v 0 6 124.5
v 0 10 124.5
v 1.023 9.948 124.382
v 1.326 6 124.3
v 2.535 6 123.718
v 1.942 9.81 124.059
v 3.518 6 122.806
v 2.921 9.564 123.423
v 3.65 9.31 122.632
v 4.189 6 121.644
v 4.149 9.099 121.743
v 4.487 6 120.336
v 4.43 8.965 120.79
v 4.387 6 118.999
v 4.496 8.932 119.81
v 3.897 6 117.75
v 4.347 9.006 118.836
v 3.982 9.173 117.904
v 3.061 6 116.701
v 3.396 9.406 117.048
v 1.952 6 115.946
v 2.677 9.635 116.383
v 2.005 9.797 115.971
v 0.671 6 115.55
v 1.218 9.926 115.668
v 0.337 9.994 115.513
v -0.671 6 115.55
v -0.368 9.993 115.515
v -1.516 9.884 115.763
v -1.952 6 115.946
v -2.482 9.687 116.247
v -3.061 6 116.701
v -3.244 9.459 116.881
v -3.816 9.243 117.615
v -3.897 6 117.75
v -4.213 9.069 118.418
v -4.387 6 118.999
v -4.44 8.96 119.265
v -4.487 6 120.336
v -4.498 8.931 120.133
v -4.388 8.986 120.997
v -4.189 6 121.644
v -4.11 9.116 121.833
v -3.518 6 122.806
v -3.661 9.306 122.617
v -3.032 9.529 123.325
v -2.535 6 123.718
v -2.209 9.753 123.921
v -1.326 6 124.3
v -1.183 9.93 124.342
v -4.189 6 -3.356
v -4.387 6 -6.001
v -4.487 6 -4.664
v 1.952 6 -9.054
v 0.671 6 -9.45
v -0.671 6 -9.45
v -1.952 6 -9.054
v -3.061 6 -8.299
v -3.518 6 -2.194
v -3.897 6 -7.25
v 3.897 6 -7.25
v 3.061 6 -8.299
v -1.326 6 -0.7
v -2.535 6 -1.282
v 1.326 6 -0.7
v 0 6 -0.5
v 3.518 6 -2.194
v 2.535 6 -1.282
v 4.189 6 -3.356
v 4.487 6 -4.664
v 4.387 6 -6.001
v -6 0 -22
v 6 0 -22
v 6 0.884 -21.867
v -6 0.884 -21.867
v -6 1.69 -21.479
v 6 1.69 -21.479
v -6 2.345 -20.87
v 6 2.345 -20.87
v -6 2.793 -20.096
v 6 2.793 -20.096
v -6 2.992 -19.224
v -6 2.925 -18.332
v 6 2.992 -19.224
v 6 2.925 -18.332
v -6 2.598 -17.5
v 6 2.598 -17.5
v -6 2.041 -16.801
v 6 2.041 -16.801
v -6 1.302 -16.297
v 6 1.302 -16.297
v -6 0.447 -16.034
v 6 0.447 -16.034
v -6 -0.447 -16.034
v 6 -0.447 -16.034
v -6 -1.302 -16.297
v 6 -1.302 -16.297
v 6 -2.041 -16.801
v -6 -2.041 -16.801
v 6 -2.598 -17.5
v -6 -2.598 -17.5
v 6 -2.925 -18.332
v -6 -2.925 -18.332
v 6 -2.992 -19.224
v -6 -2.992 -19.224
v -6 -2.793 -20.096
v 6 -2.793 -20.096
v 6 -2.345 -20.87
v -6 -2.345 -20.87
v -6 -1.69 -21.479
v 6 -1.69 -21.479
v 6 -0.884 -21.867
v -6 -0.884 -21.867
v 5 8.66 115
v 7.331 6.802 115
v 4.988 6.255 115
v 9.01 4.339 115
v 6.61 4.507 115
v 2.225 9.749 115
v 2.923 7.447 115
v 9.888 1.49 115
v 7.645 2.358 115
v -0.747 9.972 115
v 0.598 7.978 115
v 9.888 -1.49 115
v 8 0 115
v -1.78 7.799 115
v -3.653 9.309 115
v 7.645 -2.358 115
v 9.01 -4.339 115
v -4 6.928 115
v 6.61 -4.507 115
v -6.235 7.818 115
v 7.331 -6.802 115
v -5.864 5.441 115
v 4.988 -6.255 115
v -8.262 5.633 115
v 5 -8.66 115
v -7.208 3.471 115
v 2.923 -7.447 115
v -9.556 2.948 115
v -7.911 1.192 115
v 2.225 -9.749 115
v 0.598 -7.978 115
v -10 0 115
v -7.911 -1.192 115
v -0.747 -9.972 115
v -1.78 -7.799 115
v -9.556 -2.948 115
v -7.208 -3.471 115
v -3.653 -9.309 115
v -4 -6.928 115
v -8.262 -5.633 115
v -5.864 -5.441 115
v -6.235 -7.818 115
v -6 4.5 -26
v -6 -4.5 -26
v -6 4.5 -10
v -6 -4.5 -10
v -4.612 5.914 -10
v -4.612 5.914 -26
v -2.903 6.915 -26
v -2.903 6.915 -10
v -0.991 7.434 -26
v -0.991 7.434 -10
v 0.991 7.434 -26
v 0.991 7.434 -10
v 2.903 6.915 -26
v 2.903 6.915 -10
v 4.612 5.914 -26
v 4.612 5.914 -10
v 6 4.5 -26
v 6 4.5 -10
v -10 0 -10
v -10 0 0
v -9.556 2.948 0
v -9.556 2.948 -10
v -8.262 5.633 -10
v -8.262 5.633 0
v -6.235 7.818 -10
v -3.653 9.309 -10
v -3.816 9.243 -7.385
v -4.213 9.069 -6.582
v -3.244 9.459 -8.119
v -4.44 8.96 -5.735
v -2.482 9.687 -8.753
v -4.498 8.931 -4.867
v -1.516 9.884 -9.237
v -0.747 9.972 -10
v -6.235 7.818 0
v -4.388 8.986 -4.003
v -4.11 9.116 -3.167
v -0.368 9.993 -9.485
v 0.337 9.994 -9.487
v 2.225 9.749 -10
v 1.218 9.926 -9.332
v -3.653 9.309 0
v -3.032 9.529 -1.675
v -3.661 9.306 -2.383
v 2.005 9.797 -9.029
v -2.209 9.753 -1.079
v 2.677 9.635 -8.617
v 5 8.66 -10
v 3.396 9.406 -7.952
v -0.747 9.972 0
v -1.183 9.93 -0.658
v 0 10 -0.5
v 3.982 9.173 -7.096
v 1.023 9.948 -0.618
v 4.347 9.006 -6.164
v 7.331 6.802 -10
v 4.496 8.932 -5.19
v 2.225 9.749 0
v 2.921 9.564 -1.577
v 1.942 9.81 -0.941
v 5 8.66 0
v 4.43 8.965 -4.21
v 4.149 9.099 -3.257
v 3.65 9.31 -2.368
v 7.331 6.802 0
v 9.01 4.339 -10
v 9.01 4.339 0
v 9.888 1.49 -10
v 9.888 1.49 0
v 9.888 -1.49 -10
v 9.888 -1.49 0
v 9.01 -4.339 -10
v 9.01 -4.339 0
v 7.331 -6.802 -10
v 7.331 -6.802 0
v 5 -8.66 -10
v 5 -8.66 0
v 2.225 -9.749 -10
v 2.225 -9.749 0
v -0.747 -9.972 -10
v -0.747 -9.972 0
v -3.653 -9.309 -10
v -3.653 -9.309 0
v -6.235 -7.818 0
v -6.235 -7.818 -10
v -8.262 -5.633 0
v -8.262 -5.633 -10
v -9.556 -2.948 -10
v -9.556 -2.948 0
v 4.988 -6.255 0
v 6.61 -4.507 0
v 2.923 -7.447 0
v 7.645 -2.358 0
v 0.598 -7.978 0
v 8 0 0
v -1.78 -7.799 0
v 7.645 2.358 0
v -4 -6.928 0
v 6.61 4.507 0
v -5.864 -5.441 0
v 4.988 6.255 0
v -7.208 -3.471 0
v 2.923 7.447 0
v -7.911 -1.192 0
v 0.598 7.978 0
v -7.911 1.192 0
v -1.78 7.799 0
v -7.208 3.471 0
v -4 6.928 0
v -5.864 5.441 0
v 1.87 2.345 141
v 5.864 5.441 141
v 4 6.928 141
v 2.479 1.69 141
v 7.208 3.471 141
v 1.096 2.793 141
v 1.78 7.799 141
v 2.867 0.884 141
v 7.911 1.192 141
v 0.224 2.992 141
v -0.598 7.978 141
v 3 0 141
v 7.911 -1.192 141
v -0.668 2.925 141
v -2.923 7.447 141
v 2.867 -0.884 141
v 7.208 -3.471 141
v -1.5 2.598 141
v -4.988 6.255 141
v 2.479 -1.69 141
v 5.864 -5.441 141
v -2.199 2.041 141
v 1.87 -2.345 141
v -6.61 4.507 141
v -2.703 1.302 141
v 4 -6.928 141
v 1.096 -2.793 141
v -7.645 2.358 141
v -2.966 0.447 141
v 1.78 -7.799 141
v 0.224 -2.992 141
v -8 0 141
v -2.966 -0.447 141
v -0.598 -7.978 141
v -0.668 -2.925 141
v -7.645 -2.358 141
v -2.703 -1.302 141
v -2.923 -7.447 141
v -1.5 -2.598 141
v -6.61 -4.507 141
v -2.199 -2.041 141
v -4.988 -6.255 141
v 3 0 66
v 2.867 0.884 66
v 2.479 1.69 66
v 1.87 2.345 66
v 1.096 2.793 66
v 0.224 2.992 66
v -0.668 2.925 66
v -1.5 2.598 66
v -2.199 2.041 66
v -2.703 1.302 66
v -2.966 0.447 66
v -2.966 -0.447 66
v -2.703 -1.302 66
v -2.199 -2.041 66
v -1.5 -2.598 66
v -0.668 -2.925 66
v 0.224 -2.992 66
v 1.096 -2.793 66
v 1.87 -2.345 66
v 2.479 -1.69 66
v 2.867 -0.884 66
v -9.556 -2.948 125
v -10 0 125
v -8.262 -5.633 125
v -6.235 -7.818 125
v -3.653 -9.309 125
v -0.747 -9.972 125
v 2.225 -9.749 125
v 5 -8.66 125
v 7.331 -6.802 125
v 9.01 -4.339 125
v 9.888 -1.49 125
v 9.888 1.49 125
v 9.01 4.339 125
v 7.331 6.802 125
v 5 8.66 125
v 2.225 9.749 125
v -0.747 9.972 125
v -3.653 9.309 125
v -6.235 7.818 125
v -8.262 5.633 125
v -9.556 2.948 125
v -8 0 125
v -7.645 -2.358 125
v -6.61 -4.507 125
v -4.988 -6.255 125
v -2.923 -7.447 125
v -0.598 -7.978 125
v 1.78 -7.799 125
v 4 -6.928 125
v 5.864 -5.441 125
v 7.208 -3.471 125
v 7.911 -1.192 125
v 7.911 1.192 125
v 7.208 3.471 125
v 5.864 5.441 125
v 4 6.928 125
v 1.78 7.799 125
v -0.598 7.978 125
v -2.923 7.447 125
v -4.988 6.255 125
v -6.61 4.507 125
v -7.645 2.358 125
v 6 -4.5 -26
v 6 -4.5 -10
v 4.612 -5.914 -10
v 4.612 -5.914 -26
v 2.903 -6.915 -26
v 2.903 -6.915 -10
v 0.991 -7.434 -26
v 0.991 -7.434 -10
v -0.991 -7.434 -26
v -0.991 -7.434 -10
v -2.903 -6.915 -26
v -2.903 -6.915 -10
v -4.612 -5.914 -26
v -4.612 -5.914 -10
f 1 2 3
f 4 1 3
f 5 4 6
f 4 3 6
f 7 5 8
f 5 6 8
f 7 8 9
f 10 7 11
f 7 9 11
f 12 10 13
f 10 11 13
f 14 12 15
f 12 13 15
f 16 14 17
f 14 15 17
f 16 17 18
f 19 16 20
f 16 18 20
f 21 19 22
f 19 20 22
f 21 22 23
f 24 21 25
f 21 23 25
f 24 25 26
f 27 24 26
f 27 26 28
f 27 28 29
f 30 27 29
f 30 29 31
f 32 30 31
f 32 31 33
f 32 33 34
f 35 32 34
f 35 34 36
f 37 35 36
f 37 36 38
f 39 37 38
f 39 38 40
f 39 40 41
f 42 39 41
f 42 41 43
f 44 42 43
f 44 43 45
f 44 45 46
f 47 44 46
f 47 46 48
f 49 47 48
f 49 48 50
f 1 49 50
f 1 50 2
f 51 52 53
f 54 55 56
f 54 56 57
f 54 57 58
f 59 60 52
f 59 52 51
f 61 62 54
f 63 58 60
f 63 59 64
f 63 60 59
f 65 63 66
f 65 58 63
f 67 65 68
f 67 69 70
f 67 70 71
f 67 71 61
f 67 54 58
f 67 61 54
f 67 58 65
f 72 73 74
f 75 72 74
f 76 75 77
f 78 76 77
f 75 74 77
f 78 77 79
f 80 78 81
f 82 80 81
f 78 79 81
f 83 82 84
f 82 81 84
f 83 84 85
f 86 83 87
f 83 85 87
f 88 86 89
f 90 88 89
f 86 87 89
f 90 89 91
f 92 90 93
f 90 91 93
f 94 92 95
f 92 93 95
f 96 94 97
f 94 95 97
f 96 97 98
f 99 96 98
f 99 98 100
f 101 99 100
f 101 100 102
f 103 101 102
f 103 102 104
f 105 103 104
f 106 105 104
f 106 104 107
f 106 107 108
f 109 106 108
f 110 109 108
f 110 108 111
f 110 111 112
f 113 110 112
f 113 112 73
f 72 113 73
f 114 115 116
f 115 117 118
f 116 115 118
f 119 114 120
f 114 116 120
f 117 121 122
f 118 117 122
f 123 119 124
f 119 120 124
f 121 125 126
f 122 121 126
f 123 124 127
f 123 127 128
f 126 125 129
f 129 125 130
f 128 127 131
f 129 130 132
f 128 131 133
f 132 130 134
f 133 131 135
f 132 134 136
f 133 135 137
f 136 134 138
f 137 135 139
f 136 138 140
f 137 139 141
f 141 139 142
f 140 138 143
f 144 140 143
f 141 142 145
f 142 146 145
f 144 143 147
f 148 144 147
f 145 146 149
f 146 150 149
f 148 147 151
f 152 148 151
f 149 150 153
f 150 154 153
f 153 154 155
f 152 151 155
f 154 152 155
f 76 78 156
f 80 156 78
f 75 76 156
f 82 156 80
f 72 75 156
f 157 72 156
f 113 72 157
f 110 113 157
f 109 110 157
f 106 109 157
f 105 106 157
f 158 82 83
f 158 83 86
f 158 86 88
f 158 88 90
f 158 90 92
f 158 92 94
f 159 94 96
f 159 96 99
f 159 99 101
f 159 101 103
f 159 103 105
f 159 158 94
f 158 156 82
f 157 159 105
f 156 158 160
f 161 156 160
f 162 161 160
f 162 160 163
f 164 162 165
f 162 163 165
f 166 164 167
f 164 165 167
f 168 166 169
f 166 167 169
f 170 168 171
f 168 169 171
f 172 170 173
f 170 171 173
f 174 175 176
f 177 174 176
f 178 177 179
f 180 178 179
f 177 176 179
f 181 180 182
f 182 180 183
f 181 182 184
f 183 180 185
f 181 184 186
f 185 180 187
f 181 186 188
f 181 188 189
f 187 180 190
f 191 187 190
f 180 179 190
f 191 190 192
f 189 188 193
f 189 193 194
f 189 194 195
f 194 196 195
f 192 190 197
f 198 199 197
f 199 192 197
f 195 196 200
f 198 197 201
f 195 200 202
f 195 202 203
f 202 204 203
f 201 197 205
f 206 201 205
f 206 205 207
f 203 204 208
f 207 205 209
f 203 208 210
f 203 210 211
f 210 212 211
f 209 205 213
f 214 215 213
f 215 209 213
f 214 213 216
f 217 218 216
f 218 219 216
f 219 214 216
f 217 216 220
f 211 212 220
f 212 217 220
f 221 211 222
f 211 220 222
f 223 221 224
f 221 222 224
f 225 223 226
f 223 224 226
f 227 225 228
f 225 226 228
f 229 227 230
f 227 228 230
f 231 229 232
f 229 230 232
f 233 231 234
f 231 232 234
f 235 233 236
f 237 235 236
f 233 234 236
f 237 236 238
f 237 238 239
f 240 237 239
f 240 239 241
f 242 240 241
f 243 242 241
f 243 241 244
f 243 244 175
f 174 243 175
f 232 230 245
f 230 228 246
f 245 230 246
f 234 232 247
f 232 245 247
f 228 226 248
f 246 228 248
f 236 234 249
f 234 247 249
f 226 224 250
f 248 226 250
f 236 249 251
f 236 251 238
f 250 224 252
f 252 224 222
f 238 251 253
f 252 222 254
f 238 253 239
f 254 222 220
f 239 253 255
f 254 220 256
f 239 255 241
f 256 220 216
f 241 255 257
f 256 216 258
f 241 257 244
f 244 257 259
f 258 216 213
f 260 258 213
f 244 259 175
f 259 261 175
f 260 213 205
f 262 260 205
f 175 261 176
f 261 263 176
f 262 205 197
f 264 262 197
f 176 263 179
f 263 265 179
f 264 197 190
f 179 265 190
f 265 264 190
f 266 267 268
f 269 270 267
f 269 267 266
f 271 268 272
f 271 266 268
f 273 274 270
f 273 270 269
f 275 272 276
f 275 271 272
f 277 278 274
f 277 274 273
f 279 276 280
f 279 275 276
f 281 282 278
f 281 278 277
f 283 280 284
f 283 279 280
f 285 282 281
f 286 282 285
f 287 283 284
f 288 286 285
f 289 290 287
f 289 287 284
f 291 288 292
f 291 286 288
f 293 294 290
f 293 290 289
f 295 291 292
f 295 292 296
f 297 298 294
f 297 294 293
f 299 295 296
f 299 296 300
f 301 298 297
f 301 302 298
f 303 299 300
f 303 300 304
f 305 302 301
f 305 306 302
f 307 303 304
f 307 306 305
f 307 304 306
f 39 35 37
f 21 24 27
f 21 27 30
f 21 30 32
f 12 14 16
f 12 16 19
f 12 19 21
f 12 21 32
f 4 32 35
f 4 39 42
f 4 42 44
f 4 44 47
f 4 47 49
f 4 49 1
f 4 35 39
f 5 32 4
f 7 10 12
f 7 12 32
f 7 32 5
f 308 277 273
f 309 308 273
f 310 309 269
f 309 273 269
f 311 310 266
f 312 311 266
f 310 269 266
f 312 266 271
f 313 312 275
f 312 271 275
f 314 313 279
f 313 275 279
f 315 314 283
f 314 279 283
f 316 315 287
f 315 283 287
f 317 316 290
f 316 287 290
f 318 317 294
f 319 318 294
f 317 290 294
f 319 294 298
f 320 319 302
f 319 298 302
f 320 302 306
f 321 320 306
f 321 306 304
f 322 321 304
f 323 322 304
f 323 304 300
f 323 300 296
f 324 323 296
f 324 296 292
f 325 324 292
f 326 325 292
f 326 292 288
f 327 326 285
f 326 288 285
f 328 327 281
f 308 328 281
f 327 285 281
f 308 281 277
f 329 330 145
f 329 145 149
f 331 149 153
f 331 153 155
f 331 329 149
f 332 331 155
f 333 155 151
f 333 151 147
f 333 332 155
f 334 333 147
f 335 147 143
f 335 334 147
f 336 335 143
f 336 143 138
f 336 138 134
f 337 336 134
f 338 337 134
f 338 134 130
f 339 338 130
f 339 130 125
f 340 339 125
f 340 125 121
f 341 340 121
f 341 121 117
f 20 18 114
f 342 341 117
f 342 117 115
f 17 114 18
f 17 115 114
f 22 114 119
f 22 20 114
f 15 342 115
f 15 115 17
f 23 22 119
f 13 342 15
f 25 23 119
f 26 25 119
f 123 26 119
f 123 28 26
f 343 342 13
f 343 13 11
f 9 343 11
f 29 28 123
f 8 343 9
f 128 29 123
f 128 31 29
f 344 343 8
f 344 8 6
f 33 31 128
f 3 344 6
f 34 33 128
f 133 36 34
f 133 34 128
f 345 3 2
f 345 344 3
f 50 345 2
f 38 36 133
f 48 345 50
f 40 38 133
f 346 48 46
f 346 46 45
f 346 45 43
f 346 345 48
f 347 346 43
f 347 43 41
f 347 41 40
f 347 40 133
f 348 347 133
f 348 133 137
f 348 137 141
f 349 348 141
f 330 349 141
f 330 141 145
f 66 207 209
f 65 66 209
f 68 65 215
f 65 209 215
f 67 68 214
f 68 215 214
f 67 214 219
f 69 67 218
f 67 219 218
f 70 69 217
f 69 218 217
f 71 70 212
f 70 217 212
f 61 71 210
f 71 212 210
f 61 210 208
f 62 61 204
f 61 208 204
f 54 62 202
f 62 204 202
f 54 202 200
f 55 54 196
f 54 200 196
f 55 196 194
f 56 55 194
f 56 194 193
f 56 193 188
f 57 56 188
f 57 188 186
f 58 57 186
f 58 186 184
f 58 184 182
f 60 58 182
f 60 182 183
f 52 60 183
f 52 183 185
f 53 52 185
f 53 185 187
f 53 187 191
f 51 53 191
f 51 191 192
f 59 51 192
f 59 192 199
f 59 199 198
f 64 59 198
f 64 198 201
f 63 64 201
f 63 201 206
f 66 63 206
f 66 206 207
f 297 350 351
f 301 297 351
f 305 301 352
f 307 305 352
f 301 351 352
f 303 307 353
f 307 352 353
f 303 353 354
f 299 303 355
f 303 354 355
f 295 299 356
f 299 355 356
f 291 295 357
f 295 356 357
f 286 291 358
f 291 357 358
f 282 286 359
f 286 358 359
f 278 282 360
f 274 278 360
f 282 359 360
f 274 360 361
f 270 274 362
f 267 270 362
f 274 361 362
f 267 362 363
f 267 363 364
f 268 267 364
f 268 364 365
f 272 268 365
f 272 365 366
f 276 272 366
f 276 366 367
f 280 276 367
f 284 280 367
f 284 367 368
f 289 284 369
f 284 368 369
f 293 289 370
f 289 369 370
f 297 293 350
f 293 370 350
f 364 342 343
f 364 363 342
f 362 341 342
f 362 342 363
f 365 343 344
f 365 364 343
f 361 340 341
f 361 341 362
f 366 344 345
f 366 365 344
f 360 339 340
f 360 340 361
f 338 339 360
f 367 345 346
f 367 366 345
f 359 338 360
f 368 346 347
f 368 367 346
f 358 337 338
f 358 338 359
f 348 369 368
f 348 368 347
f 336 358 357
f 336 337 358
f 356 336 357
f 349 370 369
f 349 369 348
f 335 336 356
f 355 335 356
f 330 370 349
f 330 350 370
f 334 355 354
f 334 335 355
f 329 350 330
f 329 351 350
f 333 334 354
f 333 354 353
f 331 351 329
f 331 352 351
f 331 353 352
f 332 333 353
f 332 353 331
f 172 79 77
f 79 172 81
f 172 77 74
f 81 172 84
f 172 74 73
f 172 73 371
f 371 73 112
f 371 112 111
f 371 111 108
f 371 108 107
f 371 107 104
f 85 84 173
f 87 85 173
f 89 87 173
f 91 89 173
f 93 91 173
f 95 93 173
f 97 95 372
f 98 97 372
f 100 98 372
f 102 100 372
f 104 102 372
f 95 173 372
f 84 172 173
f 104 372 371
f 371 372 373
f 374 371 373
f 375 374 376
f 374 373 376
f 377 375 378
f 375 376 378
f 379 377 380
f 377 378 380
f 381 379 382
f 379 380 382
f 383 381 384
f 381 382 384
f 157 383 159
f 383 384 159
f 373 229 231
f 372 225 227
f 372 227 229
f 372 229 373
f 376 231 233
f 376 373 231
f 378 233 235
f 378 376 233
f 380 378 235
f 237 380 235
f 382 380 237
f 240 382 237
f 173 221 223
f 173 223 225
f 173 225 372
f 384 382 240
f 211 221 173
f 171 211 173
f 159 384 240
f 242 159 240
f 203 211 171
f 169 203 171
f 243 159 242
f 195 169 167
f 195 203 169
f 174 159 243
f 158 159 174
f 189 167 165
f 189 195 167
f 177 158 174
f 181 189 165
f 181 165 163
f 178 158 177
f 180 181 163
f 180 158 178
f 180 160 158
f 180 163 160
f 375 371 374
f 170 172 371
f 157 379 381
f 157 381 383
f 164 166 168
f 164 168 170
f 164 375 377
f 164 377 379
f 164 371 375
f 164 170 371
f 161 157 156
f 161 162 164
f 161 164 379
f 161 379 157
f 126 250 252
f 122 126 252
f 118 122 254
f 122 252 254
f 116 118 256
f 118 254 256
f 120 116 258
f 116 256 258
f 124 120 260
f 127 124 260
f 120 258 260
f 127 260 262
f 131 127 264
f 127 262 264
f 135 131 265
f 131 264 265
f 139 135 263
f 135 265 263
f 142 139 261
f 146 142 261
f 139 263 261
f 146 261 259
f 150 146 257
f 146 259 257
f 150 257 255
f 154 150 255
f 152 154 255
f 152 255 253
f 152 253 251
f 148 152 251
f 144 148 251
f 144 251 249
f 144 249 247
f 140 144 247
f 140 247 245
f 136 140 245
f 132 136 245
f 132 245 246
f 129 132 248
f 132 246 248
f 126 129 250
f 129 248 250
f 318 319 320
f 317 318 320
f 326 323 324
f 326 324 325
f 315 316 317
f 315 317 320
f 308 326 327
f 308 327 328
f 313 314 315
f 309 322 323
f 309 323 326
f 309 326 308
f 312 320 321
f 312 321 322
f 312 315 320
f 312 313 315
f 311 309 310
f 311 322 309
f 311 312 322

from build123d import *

# Parameters (mm, degrees)
SKETCH1_R           = 8
BOSS_EXTRUDE1_DEPTH = 115
SKETCH2_R           = 10
BOSS_EXTRUDE2_DEPTH = 10
BOSS_EXTRUDE3_START = 10
SKETCH3_R           = 10
BOSS_EXTRUDE3_DEPTH = 10
SKETCH4_R           = 8
BOSS_EXTRUDE4_DEPTH = 16
SKETCH5_R           = 7.5
BOSS_EXTRUDE5_DEPTH = 16
SKETCH6_R           = 3
CUT_EXTRUDE1_DEPTH  = 75
SKETCH7_R           = 4.5
CUT_EXTRUDE2_DEPTH  = 4
CUT_EXTRUDE3_START  = -16
CUT_EXTRUDE3_DEPTH  = 16
SKETCH9_R           = 3
CUT_EXTRUDE4_DEPTH  = 143.256810049


with BuildPart() as part:
    # Sketch1 → Boss-Extrude1 (new body)
    with BuildSketch(Plane.XY):
        Circle(SKETCH1_R)
    extrude(amount=BOSS_EXTRUDE1_DEPTH)

    # Sketch2 → Boss-Extrude2 (add)
    with BuildSketch(Plane(origin=(0, 0, 0), x_dir=(-1, 0, 0), z_dir=(0, 0, -1))):
        Circle(SKETCH2_R)
    extrude(amount=BOSS_EXTRUDE2_DEPTH)

    # Sketch3 → Boss-Extrude3 (add)
    with BuildSketch(Plane.XY.offset(115).offset(BOSS_EXTRUDE3_START)):
        with Locations(Location((0, 0, 0), (0, 0, 180))):
            Circle(SKETCH3_R)
    extrude(amount=-BOSS_EXTRUDE3_DEPTH)

    # Sketch4 → Boss-Extrude4 (add)
    with BuildSketch(Plane.XY.offset(125)):
        with Locations(Location((0, 0, 0), (0, 0, 180))):
            Circle(SKETCH4_R)
    extrude(amount=BOSS_EXTRUDE4_DEPTH)

    # Sketch5 → Boss-Extrude5 (add)
    with BuildSketch(Plane(origin=(0, 0, -10), x_dir=(-1, 0, 0), z_dir=(0, 0, -1))):
        Circle(SKETCH5_R)
    extrude(amount=BOSS_EXTRUDE5_DEPTH)

    # Sketch6 → Cut-Extrude1 (cut)
    with BuildSketch(Plane.XY.offset(141)):
        Circle(SKETCH6_R)
    extrude(amount=-CUT_EXTRUDE1_DEPTH, mode=Mode.SUBTRACT)

    # Sketch7 → Cut-Extrude2 (cut)
    with BuildSketch(Plane(origin=(0, 10, 0), x_dir=(-1, 0, 0), z_dir=(0, 1, 0))):
        with Locations(Location((0, 120, 0), (0, 0, 90))):
            Circle(SKETCH7_R)
        with Locations(Location((0, -5, 0), (0, 0, 90))):
            Circle(SKETCH7_R)
    extrude(amount=-CUT_EXTRUDE2_DEPTH, mode=Mode.SUBTRACT)

    # Sketch8 → Cut-Extrude3 (cut)
    with BuildSketch(Plane(origin=(0, 0, -26), x_dir=(-1, 0, 0), z_dir=(0, 0, -1)).offset(CUT_EXTRUDE3_START)):
        with BuildLine():
            Line((-6, 4.5), (-6, -4.5))
            ThreePointArc((-6, -4.5), (-7.5, 0), (-6, 4.5))
        make_face()
        with BuildLine():
            Line((6, 4.5), (6, -4.5))
            ThreePointArc((6, -4.5), (7.5, 0), (6, 4.5))
        make_face()
    extrude(amount=CUT_EXTRUDE3_DEPTH, mode=Mode.SUBTRACT)

    # Sketch9 → Cut-Extrude4 (cut, through all)
    with BuildSketch(Plane(origin=(6, 0, 0), x_dir=(0, 0, -1), z_dir=(1, 0, 0))):
        with Locations((19, 0)):
            Circle(SKETCH9_R)
    extrude(amount=-CUT_EXTRUDE4_DEPTH, mode=Mode.SUBTRACT)


solid = part.part
